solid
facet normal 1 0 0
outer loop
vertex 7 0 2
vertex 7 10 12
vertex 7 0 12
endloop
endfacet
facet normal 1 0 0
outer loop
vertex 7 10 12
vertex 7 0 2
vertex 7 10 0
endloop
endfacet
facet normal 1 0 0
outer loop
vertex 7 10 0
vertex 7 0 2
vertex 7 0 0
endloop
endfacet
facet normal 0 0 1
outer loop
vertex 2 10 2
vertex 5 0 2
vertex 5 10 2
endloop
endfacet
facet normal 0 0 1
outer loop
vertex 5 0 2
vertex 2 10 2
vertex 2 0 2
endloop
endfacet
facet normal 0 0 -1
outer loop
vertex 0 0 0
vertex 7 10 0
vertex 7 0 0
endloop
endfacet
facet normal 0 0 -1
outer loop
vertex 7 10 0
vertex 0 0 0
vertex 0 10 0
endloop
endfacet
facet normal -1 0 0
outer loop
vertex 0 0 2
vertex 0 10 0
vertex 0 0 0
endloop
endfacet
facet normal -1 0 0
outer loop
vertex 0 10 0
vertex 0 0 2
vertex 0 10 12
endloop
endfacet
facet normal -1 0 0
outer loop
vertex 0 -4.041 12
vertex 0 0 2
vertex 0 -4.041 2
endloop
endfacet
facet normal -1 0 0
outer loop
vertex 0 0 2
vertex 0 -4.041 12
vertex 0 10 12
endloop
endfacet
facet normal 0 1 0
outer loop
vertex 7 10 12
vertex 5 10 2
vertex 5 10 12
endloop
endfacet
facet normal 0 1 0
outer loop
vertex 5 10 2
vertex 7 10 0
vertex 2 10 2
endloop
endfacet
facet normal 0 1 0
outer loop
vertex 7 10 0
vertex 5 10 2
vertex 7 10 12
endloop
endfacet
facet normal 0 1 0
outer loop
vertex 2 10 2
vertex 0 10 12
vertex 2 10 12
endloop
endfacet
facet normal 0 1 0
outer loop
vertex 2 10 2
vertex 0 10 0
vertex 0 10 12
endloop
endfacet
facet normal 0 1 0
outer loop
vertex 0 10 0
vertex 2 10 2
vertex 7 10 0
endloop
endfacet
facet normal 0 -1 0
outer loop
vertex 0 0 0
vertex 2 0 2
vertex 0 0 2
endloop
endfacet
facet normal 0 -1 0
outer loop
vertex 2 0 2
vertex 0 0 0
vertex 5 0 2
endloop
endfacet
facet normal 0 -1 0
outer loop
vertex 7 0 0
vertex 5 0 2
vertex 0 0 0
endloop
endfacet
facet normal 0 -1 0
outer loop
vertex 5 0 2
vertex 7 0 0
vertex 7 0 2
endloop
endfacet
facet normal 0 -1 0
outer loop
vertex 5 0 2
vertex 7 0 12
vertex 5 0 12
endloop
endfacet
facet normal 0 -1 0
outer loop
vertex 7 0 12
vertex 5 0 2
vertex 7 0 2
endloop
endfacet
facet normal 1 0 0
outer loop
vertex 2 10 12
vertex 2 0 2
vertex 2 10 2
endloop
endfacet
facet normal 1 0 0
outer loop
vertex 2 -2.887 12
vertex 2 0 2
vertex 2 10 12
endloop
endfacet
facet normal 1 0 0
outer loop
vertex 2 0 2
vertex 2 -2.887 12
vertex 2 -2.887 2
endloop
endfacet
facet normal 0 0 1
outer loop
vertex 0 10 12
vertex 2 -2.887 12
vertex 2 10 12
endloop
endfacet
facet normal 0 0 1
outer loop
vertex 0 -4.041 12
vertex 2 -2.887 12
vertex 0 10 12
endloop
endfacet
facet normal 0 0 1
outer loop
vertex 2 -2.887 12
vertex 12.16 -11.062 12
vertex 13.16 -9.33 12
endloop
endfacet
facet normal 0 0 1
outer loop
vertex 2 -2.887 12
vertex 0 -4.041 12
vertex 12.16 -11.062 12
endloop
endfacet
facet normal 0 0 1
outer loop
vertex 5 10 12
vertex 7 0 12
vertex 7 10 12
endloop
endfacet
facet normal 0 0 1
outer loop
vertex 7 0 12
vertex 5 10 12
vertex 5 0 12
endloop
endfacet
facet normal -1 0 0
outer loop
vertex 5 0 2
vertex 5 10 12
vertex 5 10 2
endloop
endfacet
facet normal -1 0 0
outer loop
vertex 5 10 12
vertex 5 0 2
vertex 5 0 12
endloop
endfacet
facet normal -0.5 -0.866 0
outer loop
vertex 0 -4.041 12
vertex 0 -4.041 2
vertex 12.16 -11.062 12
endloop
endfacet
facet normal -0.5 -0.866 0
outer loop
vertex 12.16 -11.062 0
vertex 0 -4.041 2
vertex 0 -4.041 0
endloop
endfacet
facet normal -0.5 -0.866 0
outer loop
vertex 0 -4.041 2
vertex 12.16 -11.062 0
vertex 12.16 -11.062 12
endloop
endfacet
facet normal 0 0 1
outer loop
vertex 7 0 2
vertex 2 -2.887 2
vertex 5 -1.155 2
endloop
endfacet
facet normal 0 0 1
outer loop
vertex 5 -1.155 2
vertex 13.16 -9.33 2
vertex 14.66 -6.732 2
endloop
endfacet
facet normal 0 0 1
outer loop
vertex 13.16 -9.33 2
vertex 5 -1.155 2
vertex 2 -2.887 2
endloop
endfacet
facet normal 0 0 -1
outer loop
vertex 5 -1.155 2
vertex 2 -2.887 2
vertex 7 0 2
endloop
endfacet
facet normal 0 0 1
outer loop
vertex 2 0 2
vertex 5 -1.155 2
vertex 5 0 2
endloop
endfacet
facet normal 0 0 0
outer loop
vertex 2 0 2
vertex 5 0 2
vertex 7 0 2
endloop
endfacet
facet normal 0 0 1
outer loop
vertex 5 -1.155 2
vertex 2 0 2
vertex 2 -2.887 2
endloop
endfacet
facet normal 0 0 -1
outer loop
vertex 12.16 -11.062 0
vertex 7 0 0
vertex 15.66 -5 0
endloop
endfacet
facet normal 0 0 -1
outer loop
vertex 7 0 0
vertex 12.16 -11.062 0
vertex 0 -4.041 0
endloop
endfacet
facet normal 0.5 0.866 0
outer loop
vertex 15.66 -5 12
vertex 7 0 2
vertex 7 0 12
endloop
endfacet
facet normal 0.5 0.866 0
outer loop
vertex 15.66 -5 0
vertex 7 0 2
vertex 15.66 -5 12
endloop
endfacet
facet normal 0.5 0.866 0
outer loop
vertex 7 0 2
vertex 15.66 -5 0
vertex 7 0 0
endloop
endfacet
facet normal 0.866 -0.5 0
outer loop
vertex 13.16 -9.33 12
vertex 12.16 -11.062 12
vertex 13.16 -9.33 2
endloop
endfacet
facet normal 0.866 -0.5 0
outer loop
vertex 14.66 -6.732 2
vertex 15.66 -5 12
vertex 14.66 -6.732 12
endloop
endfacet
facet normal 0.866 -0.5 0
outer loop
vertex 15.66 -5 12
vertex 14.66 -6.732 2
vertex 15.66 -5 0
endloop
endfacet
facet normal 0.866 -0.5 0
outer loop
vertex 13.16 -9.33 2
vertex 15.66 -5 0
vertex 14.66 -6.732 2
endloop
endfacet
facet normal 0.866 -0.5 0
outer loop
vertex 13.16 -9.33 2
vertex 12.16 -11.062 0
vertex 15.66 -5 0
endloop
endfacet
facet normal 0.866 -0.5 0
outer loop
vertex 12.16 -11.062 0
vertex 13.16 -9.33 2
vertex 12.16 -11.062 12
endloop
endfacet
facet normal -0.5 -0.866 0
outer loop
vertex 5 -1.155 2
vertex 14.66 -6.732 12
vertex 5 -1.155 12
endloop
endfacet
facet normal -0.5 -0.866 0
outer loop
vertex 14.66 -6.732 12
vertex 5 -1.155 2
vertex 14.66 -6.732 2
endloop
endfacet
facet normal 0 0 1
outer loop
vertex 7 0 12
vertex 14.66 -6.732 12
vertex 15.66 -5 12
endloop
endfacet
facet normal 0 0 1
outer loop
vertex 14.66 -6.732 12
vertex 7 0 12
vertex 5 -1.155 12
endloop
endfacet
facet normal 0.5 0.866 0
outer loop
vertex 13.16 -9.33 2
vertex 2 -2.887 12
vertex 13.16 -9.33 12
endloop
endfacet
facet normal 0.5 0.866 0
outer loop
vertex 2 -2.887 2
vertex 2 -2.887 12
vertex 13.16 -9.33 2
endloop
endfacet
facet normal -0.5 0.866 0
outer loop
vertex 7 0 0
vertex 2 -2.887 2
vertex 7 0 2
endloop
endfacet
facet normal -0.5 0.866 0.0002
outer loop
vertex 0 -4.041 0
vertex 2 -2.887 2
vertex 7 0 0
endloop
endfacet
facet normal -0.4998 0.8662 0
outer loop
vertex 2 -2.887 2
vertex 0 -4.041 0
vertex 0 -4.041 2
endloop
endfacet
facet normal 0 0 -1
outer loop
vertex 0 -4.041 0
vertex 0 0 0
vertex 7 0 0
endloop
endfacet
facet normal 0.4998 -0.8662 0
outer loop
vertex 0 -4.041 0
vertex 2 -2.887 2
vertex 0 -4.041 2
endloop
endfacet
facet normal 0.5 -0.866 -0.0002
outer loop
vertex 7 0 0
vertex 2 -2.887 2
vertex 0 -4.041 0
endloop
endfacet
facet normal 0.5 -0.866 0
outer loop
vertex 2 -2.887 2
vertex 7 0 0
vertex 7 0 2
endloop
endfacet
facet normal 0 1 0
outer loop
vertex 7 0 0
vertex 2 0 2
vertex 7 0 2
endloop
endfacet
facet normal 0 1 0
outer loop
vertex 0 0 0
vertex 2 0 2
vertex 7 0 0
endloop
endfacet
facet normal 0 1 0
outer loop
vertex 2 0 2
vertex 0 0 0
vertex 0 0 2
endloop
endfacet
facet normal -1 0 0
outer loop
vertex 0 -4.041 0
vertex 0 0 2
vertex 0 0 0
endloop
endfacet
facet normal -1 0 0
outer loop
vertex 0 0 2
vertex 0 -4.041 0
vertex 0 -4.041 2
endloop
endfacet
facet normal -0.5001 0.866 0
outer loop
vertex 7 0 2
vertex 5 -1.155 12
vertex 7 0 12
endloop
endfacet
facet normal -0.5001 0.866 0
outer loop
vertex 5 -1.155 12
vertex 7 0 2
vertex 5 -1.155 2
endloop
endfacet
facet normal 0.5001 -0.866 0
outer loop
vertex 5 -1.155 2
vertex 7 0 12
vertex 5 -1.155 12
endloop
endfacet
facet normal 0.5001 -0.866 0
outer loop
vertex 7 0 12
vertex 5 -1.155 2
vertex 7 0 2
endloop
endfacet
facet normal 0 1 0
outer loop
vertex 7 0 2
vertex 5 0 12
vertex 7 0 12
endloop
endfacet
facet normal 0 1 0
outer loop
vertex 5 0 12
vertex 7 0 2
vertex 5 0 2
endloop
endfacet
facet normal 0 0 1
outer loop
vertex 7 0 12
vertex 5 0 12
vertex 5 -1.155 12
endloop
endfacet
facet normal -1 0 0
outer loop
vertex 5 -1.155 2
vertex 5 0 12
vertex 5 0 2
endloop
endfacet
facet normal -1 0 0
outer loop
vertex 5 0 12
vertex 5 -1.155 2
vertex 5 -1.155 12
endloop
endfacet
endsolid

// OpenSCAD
// file: joint_commons.scad
module arm(gapThickness, wallThickness, wallHeight, bottomThickness, armLength)
{
    // Bottom
    cube([gapThickness + (2 * wallThickness), armLength, bottomThickness]);
    // Walls
    translate([0, 0, bottomThickness])
        cube([wallThickness, armLength, wallHeight]);
    translate([wallThickness+gapThickness, 0, bottomThickness])
        cube([wallThickness, armLength, wallHeight]);
}

module wedge(wedgeFlatEdge, wedgeExtrusion)
{
    union()
    {
        linear_extrude(height=wedgeExtrusion)
            polygon(points=[[0,0], [0,wedgeFlatEdge], [wedgeFlatEdge/sqrt(3), wedgeFlatEdge]]);
        linear_extrude(height=wedgeExtrusion)
            rotate([0,180,-60])
            polygon(points=[[0,0], [0,wedgeFlatEdge], [wedgeFlatEdge/sqrt(3), wedgeFlatEdge]]);
    }
}
// main file
include <joint_commons.scad>;

module angledJoint(gapThickness, wallThickness, wallHeight, bottomThickness, armLength)
{
    // Arm 1
    arm(gapThickness, wallThickness, wallHeight, bottomThickness, armLength);
    armWidth = (2*wallThickness) + gapThickness;
    // Extra long side of arm
    translate([0, -armWidth/sqrt(3), bottomThickness])
        cube([wallThickness, armWidth/sqrt(3), wallHeight]);
    
    translate([(2*wallThickness)+gapThickness, 0, 0])
        rotate([0,0,-120])
        {
            // Arm 2
            arm(gapThickness, wallThickness, wallHeight, bottomThickness, armLength);
            // Extra long side of other arm
            translate([gapThickness+wallThickness, -armWidth/sqrt(3), bottomThickness])
                cube([wallThickness, armWidth/sqrt(3), wallHeight]);
        }
     // Bottom Wedge
     translate([armWidth, 0, 0])
        rotate([0,0,150])
        wedge(armWidth, bottomThickness);
     // Wall Wedge
     translate([armWidth,0, bottomThickness])
        rotate([0,0,150])
        wedge(wallThickness, wallHeight);
}

gapThickness = 3;
wallThickness = 2;
wallHeight = 10;
bottomThickness = 2;
armLength = 10;

angledJoint(gapThickness, wallThickness, wallHeight, bottomThickness, armLength);
